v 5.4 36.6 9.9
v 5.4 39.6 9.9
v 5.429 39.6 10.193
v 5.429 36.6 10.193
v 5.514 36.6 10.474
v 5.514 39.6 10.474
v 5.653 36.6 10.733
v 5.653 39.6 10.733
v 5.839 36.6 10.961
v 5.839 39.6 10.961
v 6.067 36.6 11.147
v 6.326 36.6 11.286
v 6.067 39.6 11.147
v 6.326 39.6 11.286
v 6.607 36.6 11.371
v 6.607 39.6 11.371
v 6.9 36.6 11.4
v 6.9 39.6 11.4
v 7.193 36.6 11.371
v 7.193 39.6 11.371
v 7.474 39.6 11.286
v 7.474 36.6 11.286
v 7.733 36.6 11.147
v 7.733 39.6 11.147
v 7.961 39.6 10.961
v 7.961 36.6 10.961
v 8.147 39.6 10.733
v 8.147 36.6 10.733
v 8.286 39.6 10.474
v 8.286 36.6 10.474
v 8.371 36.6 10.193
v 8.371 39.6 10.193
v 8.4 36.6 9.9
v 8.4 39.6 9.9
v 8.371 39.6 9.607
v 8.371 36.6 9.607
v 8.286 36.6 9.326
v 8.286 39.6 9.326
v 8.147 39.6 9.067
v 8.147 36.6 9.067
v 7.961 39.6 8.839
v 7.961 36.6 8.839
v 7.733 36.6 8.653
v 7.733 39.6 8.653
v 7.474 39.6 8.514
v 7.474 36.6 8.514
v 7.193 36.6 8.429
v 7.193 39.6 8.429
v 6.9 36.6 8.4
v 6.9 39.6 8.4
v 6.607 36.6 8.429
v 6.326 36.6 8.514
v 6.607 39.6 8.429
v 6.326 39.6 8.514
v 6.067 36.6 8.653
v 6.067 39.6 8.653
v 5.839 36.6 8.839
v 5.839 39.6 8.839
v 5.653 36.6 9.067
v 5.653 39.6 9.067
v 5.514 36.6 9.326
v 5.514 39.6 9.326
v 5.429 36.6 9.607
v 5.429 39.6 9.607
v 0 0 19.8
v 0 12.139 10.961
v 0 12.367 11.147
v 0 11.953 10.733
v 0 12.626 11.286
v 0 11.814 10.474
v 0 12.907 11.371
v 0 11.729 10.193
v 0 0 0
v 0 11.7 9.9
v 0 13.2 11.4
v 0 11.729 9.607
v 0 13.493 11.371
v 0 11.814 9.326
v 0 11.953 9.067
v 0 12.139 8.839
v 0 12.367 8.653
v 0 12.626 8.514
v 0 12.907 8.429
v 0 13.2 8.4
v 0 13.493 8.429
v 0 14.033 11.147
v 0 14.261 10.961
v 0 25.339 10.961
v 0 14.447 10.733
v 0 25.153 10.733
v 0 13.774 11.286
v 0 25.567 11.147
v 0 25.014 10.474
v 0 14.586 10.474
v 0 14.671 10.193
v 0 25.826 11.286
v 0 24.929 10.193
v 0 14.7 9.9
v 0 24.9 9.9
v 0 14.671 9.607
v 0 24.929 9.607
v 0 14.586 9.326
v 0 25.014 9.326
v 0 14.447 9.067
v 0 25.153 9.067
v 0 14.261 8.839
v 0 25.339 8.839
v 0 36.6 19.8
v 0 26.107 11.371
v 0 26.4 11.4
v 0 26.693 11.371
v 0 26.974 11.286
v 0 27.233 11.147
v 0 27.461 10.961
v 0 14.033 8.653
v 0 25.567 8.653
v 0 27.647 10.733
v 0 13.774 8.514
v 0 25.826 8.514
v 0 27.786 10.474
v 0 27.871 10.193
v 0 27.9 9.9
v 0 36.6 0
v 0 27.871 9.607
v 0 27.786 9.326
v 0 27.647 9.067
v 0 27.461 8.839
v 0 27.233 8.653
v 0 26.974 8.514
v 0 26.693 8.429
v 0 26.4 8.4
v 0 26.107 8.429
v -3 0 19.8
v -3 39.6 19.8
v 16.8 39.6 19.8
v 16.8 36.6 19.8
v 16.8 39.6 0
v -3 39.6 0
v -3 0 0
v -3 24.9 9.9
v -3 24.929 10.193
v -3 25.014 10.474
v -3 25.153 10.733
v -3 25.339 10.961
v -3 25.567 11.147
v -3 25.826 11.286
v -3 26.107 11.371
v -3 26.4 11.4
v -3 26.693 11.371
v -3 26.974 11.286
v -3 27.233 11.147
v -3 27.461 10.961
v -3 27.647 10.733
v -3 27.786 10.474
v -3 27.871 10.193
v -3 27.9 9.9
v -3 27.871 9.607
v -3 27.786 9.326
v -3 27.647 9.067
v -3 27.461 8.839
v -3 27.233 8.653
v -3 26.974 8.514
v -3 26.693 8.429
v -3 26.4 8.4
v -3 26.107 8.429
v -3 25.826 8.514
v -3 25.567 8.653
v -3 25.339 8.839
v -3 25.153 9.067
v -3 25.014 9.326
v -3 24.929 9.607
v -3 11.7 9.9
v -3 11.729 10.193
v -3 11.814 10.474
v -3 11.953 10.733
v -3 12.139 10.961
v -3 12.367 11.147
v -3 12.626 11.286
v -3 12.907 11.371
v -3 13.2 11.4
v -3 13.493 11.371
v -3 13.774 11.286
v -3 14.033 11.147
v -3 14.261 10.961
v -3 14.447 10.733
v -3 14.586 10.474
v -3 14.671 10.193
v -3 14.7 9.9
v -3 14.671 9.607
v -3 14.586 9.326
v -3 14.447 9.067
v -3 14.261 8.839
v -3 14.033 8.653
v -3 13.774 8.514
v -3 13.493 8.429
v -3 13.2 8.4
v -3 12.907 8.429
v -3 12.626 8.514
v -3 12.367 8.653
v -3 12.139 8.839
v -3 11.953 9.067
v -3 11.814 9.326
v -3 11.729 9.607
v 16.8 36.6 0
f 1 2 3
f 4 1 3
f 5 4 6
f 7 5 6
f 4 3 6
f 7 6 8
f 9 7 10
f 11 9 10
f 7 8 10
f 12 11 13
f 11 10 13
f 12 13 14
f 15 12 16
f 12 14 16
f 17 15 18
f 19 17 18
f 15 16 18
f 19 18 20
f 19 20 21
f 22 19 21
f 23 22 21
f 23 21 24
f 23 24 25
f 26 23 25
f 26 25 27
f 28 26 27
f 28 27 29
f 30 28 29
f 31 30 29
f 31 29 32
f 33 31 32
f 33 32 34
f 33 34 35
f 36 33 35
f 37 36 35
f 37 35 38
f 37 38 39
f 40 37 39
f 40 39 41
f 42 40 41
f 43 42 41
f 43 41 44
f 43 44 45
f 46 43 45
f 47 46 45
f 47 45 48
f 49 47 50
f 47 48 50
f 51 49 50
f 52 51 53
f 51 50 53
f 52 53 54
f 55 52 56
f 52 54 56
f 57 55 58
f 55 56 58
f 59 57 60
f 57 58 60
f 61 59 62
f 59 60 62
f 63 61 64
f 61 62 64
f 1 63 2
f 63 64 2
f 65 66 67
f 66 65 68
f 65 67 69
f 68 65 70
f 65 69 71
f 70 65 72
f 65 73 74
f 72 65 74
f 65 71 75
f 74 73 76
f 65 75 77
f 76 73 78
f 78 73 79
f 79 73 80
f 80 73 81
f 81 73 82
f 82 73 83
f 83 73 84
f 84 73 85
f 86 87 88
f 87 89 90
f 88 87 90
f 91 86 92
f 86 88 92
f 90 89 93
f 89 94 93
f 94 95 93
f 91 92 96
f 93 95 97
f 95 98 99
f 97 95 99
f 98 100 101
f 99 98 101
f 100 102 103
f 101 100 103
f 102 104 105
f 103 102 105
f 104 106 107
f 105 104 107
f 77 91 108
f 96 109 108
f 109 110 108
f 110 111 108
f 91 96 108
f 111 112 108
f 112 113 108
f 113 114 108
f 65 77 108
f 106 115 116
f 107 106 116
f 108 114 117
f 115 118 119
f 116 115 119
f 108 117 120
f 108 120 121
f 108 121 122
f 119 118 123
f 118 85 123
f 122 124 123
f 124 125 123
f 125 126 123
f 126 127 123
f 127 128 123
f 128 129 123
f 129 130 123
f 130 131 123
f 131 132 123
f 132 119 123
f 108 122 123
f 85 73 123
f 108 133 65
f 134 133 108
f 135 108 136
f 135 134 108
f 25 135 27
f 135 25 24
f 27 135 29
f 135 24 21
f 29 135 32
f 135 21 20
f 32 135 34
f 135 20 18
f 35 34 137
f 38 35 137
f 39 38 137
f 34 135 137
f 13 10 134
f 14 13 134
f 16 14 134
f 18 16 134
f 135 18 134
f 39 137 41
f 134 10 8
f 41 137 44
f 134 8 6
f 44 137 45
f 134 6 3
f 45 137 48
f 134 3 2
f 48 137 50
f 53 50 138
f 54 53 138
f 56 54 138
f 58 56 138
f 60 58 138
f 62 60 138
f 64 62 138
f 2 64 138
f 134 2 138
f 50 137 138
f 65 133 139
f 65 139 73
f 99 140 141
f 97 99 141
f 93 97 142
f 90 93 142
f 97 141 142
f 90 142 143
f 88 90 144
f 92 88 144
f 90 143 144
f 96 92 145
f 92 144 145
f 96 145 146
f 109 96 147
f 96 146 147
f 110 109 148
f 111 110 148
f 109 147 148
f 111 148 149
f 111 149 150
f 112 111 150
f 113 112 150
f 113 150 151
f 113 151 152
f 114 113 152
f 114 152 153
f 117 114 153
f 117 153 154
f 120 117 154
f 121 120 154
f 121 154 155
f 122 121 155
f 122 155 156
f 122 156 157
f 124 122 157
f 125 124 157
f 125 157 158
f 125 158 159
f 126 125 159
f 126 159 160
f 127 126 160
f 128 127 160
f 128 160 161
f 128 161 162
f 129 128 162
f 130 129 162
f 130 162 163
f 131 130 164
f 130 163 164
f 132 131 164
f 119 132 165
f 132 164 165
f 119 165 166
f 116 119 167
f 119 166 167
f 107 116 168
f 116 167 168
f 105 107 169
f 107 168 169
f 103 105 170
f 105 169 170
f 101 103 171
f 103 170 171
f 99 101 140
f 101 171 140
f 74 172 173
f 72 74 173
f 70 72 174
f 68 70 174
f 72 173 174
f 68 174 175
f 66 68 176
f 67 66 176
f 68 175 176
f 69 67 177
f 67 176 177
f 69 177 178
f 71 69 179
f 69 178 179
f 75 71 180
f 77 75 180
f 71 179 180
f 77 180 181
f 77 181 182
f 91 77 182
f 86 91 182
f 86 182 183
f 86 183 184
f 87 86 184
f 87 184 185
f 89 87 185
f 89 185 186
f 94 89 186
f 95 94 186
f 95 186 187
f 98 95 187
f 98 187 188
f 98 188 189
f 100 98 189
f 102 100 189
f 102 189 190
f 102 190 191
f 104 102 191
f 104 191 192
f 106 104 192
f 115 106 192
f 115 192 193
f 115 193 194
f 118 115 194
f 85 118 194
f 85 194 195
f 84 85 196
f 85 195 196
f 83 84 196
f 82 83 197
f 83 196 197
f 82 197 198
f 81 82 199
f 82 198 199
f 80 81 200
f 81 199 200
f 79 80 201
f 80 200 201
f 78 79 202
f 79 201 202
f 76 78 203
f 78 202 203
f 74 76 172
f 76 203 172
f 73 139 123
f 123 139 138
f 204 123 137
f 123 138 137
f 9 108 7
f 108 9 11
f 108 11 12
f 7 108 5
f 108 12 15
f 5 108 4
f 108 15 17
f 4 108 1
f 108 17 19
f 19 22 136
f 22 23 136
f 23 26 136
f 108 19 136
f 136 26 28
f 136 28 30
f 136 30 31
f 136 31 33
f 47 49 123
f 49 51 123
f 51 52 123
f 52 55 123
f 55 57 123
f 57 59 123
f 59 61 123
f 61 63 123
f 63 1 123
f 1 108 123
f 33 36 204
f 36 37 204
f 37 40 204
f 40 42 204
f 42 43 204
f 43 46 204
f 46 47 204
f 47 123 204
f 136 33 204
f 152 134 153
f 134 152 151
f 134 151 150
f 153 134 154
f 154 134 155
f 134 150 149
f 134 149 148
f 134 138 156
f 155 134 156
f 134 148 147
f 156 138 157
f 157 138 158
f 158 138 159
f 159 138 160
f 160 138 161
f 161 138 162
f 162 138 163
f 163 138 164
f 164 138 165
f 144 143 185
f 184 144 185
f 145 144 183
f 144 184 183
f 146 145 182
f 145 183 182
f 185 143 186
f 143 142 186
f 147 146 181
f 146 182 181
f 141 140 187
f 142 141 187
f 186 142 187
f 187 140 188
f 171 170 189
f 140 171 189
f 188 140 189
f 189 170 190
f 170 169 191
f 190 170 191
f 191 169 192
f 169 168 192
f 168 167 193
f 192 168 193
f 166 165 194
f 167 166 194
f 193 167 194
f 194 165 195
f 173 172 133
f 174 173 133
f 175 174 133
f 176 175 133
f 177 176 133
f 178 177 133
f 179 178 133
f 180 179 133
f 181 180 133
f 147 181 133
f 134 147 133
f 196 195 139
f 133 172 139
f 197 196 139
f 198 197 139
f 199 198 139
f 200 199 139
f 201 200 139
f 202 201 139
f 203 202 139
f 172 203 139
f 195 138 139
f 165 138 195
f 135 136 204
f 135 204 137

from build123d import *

# Parameters (mm, degrees)
BOSS_EXTRUDE1_DEPTH = 19.8
SKETCH2_R           = 1.5
CUT_EXTRUDE1_DEPTH  = 19.8
SKETCH3_R           = 1.5
CUT_EXTRUDE2_DEPTH  = 19.8


with BuildPart() as part:
    # Sketch1 → Boss-Extrude1 (new body)
    with BuildSketch(Plane.XY):
        Polygon((0, 0), (0, 36.6), (16.8, 36.6), (16.8, 39.6), (-3, 39.6), (-3, 0), align=None)
    extrude(amount=BOSS_EXTRUDE1_DEPTH)

    # Sketch2 → Cut-Extrude1 (cut)
    with BuildSketch(Plane(origin=(0, 39.6, 0), x_dir=(1, 0, 0), z_dir=(0, 1, 0))):
        with Locations(Location((6.9, -9.9, 0), (0, 0, 180))):
            Circle(SKETCH2_R)
    extrude(amount=-CUT_EXTRUDE1_DEPTH, mode=Mode.SUBTRACT)

    # Sketch3 → Cut-Extrude2 (cut)
    with BuildSketch(Plane.ZY.offset(3)):
        with Locations(Location((9.9, 26.4, 0), (0, 0, 270))):
            Circle(SKETCH3_R)
        with Locations(Location((9.9, 13.2, 0), (0, 0, 270))):
            Circle(SKETCH3_R)
    extrude(amount=-CUT_EXTRUDE2_DEPTH, mode=Mode.SUBTRACT)


solid = part.part
